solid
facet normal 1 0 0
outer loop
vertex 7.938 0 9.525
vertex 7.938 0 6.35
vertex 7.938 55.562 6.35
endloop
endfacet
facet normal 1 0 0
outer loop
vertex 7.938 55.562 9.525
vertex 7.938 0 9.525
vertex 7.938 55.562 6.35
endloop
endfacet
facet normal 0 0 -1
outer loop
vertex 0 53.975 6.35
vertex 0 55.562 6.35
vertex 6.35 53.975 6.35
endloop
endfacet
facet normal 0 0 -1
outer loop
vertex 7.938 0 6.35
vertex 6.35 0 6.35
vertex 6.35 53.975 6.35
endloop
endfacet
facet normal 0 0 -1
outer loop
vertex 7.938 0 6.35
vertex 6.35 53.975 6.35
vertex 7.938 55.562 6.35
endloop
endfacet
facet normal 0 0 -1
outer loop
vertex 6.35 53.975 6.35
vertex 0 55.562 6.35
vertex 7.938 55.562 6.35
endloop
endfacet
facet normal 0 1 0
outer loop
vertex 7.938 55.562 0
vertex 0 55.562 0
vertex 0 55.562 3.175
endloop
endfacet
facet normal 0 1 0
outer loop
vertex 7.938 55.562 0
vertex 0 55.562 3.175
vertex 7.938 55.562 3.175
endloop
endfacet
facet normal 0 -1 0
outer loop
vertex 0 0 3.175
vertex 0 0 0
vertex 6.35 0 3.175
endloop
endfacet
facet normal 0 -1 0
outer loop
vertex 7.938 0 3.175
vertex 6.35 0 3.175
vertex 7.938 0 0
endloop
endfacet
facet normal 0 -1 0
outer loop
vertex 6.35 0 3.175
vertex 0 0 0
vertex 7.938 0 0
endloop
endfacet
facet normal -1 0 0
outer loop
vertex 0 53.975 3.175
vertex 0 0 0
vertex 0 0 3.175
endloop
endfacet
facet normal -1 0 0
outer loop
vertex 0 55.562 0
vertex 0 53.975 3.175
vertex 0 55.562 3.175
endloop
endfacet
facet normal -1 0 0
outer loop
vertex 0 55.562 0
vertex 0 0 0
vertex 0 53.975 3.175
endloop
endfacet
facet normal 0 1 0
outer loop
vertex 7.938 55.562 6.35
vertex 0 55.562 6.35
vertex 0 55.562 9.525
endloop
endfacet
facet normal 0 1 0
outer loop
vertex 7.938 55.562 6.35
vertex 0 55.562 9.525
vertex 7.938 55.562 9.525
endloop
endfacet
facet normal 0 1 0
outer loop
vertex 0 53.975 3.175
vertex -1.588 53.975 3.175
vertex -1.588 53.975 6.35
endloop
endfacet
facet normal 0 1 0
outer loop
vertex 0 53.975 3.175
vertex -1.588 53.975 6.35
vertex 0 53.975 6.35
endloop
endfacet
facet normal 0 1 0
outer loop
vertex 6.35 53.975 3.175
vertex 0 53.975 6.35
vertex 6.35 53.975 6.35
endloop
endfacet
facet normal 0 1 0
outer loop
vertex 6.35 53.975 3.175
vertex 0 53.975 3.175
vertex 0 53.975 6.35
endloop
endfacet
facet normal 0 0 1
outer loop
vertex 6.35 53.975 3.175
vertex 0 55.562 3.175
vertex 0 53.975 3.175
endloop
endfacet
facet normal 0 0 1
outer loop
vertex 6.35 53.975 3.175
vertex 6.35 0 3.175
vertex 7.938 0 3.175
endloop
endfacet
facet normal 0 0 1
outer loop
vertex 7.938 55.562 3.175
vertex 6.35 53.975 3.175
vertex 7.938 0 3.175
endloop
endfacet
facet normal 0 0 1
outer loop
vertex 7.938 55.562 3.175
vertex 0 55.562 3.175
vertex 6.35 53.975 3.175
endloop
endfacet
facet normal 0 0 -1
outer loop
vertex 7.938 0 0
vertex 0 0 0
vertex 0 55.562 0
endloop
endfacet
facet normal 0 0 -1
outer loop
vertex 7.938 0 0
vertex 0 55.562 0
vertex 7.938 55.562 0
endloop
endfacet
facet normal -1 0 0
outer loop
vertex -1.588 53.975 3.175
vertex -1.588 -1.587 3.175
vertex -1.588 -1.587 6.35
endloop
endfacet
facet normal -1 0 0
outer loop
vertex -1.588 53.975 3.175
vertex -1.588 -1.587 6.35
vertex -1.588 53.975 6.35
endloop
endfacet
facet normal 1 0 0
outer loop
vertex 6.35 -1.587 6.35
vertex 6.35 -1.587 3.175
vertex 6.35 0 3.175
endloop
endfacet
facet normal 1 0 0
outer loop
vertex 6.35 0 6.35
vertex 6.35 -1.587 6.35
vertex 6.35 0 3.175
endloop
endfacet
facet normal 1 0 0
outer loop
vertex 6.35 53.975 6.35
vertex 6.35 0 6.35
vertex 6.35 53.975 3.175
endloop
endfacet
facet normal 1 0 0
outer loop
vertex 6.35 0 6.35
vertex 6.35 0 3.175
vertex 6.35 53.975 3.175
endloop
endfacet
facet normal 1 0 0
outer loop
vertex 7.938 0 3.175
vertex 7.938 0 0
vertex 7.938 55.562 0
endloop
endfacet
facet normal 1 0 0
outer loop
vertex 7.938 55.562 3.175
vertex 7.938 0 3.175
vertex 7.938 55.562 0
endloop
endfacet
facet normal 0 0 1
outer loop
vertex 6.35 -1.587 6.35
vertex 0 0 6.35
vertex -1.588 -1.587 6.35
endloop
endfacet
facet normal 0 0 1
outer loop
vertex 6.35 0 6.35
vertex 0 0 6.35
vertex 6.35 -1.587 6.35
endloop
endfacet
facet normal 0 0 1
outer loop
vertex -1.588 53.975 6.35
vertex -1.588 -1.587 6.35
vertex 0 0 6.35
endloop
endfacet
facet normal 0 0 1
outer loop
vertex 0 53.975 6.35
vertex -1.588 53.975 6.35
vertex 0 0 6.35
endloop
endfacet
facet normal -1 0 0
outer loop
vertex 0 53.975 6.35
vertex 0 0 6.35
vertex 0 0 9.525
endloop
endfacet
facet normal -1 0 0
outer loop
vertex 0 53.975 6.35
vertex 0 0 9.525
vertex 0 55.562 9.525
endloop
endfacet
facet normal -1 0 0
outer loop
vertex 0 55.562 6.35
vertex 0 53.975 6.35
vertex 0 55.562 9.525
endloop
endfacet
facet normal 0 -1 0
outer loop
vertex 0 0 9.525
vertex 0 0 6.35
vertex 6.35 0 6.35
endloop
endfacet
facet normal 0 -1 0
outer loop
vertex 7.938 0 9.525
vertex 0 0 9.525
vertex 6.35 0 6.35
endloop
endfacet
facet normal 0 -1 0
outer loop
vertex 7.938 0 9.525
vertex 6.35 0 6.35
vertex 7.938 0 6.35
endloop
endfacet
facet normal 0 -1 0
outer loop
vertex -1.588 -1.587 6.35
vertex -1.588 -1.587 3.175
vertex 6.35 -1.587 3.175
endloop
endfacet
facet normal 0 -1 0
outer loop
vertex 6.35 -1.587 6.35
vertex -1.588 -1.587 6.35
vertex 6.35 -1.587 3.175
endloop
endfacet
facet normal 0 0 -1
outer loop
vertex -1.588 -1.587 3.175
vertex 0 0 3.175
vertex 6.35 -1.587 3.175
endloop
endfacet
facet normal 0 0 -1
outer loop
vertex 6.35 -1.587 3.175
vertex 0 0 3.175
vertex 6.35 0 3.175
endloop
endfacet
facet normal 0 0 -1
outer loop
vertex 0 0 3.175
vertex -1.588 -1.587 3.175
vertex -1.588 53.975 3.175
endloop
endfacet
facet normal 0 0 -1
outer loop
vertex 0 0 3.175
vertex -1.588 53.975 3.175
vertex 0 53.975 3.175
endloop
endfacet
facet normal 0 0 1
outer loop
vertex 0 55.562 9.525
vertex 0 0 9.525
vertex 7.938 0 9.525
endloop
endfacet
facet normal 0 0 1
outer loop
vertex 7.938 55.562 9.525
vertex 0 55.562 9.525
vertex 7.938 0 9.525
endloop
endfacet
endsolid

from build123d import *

# Parameters (mm, degrees)
F2_W     = 7.9375
F2_H     = 55.5625
F3_DEPTH = 3.175
F4_W     = 7.9375
F4_H     = 55.5625
F5_DEPTH = 3.175
F6_W     = 7.9375
F6_H     = 55.5625
F7_DEPTH = 3.175


# Not quite as in the source:
# - a variable given as a bare number and used for a length is read in inches; the dataset says mm whatever the document's units were


with BuildPart() as f3:
    # F2 (on Top) → F3 (new body)
    with BuildSketch(Plane.XY):
        with Locations((3.96875, 27.78125)):
            Rectangle(F2_W, F2_H)
    extrude(amount=F3_DEPTH)

    # F4 (on face) → F5 (join)
    with BuildSketch(Plane.XY.offset(3.175)):
        with Locations((2.38125, 26.19375)):
            Rectangle(F4_W, F4_H)
    extrude(amount=F5_DEPTH)

    # F6 (on face) → F7 (join)
    with BuildSketch(Plane.XY.offset(6.35)):
        with Locations((3.96875, 27.78125)):
            Rectangle(F6_W, F6_H)
    extrude(amount=F7_DEPTH)


solid = f3.part
